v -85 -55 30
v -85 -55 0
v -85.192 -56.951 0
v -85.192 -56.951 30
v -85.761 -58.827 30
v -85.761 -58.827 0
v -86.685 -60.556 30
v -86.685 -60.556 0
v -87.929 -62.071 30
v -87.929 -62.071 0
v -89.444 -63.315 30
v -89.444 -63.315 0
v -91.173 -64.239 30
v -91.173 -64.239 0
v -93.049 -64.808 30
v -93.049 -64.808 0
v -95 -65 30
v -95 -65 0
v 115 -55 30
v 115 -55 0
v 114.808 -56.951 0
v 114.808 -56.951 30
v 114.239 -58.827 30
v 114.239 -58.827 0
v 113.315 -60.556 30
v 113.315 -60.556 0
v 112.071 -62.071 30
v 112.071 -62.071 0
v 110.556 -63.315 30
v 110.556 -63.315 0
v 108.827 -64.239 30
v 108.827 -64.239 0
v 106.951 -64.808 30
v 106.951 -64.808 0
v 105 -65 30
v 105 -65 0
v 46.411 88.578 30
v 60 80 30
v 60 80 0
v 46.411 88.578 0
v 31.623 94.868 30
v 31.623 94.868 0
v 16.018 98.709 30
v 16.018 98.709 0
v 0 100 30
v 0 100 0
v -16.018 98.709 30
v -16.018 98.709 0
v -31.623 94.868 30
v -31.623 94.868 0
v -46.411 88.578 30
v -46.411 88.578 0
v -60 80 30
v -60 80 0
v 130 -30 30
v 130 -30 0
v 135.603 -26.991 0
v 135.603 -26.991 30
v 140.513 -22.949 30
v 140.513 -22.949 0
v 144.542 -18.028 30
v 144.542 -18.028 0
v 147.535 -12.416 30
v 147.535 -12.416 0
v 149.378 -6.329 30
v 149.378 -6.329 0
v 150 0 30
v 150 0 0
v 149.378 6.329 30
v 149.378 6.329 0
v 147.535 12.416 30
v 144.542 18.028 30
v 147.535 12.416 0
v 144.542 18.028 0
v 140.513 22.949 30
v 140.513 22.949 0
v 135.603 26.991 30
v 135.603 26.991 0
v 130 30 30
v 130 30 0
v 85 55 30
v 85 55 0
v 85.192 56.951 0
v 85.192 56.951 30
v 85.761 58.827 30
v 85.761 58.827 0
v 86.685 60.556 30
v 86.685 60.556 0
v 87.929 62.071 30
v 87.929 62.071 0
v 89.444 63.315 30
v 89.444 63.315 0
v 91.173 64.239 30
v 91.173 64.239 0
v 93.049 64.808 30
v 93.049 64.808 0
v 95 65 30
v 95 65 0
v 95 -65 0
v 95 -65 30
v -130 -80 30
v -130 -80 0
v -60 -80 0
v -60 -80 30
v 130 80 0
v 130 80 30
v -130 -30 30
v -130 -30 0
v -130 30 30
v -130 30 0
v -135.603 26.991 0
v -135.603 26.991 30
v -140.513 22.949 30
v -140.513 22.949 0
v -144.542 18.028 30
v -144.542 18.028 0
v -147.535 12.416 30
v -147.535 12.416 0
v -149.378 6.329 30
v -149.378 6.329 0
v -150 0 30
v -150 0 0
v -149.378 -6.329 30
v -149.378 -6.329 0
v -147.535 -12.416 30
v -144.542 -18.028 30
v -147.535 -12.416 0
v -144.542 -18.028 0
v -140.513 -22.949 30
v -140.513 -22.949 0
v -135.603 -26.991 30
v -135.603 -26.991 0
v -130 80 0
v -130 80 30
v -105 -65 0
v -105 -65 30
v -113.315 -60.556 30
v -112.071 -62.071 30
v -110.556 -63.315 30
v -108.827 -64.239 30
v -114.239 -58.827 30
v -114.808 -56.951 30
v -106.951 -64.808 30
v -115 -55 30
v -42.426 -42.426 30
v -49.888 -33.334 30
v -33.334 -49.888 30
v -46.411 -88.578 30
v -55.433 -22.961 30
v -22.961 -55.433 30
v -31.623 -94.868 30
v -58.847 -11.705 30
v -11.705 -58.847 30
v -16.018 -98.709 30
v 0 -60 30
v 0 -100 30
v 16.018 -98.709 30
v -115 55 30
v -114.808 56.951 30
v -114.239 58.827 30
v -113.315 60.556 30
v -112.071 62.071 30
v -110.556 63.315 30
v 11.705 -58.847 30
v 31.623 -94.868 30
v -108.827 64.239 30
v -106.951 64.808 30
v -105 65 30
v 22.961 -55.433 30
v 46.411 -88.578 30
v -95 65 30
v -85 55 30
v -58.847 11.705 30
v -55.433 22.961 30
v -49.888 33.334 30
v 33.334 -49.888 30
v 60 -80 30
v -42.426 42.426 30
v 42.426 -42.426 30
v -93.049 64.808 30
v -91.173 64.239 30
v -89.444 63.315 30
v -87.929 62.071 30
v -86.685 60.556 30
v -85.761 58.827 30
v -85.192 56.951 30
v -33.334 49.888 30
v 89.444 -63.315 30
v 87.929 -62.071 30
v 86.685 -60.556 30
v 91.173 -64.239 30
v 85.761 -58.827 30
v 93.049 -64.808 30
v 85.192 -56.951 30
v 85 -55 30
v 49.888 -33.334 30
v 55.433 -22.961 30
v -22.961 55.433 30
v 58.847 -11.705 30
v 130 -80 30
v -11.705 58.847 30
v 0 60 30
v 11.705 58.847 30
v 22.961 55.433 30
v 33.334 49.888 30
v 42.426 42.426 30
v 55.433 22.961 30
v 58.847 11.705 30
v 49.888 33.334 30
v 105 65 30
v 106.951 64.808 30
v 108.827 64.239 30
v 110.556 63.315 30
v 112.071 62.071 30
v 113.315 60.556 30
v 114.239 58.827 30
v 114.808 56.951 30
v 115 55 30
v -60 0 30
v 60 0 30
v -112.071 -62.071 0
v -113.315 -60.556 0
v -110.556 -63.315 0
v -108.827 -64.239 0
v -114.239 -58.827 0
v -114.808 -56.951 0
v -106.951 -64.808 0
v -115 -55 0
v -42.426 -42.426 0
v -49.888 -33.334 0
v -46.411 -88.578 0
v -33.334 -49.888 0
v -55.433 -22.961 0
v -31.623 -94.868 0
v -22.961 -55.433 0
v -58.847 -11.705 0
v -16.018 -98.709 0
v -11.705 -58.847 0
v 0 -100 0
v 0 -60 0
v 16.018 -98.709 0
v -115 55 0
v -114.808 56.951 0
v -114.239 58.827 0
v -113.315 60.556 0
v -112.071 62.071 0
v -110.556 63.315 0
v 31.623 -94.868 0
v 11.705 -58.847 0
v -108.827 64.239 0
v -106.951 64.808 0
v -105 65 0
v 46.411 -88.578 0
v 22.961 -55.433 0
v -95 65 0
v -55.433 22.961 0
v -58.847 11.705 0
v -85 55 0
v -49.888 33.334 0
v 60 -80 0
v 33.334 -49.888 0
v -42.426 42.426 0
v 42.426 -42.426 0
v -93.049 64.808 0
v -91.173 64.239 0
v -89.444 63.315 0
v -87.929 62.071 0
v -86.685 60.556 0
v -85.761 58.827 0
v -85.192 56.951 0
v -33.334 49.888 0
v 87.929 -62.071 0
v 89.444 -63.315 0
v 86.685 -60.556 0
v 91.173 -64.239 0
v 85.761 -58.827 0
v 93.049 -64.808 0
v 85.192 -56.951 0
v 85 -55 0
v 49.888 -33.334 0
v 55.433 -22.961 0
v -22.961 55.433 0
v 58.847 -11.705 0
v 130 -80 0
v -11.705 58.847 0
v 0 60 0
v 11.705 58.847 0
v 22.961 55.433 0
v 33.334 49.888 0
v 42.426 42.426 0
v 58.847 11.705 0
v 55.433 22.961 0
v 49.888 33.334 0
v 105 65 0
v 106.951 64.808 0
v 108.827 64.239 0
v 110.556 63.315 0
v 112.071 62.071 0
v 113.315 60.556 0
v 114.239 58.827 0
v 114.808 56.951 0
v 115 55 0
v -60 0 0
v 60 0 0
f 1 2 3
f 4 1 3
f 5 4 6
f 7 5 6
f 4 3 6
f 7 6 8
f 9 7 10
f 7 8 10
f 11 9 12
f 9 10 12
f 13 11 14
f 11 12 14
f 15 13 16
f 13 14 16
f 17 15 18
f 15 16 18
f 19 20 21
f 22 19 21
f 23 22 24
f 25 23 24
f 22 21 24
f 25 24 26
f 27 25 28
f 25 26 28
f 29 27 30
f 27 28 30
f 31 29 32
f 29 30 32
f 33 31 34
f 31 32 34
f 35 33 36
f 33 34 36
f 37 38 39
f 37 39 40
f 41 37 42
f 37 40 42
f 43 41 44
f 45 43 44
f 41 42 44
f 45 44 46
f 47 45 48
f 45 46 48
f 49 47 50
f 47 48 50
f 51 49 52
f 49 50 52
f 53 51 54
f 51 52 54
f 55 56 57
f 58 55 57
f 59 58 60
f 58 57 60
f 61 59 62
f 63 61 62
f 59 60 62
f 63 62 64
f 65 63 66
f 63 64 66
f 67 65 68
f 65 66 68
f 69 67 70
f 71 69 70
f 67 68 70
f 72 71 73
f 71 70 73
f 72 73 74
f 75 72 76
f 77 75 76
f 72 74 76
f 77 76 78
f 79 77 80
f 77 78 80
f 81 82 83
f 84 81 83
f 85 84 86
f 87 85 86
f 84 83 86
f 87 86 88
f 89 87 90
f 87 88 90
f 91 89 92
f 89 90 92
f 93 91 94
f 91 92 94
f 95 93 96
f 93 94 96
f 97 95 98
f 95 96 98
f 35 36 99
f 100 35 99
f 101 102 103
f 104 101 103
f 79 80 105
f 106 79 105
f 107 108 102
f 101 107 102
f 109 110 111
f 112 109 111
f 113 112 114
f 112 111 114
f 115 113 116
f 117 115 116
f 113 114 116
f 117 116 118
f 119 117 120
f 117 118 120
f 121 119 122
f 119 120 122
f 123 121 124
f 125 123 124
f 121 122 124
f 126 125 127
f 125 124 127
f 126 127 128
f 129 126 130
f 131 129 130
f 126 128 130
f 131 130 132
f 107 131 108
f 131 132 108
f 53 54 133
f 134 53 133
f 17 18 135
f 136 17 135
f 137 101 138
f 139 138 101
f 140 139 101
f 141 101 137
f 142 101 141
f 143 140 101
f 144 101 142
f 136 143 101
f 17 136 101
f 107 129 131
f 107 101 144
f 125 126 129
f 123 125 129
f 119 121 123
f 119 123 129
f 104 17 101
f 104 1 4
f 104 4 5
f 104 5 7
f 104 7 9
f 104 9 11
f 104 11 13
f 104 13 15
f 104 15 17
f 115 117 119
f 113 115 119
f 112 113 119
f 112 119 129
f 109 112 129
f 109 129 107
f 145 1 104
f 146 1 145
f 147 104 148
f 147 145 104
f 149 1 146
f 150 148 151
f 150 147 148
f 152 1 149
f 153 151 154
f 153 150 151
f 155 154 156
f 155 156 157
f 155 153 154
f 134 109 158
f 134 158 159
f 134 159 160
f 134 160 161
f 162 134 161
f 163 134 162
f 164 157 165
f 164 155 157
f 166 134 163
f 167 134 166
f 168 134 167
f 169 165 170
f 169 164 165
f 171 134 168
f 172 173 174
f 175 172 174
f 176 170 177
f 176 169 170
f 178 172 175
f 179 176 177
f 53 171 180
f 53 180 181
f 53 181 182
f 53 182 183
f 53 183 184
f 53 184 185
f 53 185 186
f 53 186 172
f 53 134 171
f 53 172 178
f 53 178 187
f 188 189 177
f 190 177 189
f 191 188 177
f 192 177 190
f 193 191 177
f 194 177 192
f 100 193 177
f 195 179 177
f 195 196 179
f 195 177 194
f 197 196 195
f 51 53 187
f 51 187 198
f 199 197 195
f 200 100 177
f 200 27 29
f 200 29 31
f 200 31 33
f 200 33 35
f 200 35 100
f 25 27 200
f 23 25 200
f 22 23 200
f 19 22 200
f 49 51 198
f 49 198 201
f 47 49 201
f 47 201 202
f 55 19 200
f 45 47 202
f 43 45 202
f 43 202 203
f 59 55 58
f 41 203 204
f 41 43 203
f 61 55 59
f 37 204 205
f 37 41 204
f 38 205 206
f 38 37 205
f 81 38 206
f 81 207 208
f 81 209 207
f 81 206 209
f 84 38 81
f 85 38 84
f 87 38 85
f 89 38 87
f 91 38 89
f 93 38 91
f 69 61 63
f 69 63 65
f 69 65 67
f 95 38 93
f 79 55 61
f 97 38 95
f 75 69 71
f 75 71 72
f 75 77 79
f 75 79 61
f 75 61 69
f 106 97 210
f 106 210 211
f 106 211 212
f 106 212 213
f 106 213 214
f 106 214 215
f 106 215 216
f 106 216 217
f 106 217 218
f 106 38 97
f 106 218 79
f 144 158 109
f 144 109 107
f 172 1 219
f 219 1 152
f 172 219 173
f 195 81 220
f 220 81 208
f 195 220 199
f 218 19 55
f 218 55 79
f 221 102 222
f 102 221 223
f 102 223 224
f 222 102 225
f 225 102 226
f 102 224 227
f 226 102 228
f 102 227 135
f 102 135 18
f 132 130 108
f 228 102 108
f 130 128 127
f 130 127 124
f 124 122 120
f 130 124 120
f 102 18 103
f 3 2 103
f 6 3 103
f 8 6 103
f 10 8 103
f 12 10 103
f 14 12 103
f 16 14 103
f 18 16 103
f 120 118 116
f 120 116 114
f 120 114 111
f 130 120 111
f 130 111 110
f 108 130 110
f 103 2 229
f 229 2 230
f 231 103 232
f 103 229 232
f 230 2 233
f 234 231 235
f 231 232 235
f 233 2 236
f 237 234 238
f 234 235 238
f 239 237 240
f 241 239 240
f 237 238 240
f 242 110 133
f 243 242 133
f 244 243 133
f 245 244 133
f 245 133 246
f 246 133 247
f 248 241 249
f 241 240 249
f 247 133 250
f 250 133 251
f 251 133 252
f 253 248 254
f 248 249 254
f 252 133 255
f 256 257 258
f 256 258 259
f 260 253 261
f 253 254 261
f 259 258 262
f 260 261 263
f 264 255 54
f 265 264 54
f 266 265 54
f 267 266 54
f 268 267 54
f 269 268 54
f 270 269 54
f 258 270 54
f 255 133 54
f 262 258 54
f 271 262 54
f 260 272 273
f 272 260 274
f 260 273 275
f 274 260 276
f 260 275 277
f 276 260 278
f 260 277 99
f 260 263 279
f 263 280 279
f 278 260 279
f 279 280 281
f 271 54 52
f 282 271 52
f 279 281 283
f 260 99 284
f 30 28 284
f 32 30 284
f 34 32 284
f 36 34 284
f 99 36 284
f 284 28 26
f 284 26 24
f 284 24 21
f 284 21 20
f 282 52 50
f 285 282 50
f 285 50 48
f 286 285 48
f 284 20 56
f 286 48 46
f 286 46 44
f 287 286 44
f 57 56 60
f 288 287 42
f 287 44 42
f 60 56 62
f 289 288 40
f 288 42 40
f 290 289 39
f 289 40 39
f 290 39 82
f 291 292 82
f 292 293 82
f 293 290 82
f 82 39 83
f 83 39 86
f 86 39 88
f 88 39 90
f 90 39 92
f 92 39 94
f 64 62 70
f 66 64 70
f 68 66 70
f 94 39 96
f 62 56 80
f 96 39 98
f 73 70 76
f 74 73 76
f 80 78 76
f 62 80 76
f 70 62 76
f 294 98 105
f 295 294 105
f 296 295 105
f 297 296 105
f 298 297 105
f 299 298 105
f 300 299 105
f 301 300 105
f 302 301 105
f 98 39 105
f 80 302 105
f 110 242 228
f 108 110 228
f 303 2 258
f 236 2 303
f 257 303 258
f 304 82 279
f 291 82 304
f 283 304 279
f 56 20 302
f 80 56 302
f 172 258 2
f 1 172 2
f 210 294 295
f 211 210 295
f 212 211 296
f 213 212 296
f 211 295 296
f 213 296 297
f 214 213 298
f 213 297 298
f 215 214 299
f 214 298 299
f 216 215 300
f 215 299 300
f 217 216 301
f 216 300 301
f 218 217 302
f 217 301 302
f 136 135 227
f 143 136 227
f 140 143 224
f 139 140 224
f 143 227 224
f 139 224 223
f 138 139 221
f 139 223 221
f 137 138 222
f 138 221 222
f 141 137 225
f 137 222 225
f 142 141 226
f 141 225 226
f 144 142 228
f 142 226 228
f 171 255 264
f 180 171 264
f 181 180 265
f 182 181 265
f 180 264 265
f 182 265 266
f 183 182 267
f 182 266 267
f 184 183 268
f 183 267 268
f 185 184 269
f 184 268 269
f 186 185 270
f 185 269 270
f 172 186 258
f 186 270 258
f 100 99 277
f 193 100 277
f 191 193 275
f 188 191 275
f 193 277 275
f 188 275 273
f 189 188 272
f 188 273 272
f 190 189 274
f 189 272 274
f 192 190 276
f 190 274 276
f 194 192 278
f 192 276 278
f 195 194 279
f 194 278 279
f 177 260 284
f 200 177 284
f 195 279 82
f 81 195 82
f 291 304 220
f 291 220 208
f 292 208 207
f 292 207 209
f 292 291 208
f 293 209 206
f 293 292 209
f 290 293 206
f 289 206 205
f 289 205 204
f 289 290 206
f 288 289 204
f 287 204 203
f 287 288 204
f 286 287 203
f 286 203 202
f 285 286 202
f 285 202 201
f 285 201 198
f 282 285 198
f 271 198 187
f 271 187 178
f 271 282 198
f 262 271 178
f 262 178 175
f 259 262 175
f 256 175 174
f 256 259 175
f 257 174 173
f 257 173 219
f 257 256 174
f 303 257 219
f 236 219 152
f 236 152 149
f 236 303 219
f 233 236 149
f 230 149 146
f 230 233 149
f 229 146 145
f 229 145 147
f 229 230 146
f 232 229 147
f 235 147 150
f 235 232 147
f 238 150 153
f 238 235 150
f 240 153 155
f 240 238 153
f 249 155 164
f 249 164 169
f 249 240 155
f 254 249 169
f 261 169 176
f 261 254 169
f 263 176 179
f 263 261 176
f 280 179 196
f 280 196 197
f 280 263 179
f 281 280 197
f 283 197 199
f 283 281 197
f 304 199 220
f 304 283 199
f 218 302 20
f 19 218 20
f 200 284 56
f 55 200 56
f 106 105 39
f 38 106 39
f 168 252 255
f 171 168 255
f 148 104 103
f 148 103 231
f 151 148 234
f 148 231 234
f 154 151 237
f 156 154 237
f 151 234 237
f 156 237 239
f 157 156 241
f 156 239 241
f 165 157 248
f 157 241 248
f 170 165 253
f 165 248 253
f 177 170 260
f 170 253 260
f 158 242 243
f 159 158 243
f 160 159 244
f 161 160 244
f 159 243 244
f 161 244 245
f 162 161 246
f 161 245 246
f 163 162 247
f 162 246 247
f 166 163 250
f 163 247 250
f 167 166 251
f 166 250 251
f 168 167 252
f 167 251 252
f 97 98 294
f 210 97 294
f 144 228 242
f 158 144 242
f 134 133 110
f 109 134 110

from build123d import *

# Parameters (mm, degrees)
F0_R     = 60
F1_DEPTH = 30


with BuildPart() as f1:
    # F0 (on Top) → F1 (new body)
    with BuildSketch(Plane.XY):
        with BuildLine():
            Line((-130, -80), (-60, -80))
            ThreePointArc((-60, -80), (0, -100), (60, -80))
            Line((60, -80), (130, -80))
            Line((130, -80), (130, -30))
            ThreePointArc((130, -30), (150, 0), (130, 30))
            Line((130, 30), (130, 80))
            Line((130, 80), (60, 80))
            ThreePointArc((60, 80), (0, 100), (-60, 80))
            Line((-60, 80), (-130, 80))
            Line((-130, 80), (-130, 30))
            ThreePointArc((-130, 30), (-150, 0), (-130, -30))
            Line((-130, -30), (-130, -80))
        make_face()
        with BuildLine():
            Line((-115, -55), (-115, 55))
            ThreePointArc((-115, 55), (-112.071068, 62.071068), (-105, 65))
            Line((-105, 65), (-95, 65))
            ThreePointArc((-95, 65), (-87.928932, 62.071068), (-85, 55))
            Line((-85, 55), (-85, -55))
            ThreePointArc((-85, -55), (-87.928932, -62.071068), (-95, -65))
            Line((-95, -65), (-105, -65))
            ThreePointArc((-105, -65), (-112.071068, -62.071068), (-115, -55))
        make_face(mode=Mode.SUBTRACT)
        Circle(F0_R, mode=Mode.SUBTRACT)
        with BuildLine():
            ThreePointArc((85, 55), (87.928932, 62.071068), (95, 65))
            Line((95, 65), (105, 65))
            ThreePointArc((105, 65), (112.071068, 62.071068), (115, 55))
            Line((115, 55), (115, -55))
            ThreePointArc((115, -55), (112.071068, -62.071068), (105, -65))
            Line((105, -65), (95, -65))
            ThreePointArc((95, -65), (87.928932, -62.071068), (85, -55))
            Line((85, -55), (85, 55))
        make_face(mode=Mode.SUBTRACT)
    extrude(amount=F1_DEPTH)


solid = f1.part
